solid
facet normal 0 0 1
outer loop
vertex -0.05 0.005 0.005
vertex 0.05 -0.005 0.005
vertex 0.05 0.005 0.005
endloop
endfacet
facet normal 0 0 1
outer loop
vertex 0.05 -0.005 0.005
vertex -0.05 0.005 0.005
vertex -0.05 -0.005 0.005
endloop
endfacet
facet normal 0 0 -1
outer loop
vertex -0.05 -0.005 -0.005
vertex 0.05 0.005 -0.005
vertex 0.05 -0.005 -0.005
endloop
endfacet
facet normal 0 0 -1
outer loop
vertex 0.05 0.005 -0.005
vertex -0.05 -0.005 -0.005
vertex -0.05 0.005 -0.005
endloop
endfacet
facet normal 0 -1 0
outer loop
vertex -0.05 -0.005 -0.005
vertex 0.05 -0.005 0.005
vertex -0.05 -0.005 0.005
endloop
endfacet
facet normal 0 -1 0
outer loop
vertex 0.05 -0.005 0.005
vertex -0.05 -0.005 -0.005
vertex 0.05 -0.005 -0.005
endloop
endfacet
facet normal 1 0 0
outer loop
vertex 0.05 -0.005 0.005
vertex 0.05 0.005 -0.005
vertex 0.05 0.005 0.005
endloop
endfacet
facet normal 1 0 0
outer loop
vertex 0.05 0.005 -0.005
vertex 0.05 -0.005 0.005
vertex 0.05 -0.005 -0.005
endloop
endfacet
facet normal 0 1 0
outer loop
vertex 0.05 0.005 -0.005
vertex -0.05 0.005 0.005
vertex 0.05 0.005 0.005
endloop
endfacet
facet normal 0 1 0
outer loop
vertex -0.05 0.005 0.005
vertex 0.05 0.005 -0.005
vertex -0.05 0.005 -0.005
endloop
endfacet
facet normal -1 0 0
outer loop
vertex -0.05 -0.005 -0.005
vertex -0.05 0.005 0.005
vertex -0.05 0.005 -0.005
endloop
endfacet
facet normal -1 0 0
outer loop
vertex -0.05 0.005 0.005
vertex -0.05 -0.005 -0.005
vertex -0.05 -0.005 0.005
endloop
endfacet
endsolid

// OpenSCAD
$fn=64;

eps = 0.01;

module diamond_hole(th=20, d=3) {
    rotate([0,0,45]) cylinder(h=th, r=d/2, center=true, $fn=4);
}

module v_notch(len=20, width=10, height=20) {
    linear_extrude(height=height, center=true)
        polygon(points=[
            [-len/2, 0],
            [0, width/2],
            [len/2, 0],
            [0, -width/2]
        ]);
}

module bracket() {
    // Bounding box: 0.1 x 0.0 x 0.0 mm -> degenerate in Y and Z, so create a minimal valid solid
    // Use a thin plate centered at origin with X=0.1, Y=eps, Z=eps
    difference() {
        union() {
            // Central body
            cube([0.1, eps, eps], center=true);
        }
        // No-op cuts kept minimal to avoid invalid geometry
    }
}

bracket();
